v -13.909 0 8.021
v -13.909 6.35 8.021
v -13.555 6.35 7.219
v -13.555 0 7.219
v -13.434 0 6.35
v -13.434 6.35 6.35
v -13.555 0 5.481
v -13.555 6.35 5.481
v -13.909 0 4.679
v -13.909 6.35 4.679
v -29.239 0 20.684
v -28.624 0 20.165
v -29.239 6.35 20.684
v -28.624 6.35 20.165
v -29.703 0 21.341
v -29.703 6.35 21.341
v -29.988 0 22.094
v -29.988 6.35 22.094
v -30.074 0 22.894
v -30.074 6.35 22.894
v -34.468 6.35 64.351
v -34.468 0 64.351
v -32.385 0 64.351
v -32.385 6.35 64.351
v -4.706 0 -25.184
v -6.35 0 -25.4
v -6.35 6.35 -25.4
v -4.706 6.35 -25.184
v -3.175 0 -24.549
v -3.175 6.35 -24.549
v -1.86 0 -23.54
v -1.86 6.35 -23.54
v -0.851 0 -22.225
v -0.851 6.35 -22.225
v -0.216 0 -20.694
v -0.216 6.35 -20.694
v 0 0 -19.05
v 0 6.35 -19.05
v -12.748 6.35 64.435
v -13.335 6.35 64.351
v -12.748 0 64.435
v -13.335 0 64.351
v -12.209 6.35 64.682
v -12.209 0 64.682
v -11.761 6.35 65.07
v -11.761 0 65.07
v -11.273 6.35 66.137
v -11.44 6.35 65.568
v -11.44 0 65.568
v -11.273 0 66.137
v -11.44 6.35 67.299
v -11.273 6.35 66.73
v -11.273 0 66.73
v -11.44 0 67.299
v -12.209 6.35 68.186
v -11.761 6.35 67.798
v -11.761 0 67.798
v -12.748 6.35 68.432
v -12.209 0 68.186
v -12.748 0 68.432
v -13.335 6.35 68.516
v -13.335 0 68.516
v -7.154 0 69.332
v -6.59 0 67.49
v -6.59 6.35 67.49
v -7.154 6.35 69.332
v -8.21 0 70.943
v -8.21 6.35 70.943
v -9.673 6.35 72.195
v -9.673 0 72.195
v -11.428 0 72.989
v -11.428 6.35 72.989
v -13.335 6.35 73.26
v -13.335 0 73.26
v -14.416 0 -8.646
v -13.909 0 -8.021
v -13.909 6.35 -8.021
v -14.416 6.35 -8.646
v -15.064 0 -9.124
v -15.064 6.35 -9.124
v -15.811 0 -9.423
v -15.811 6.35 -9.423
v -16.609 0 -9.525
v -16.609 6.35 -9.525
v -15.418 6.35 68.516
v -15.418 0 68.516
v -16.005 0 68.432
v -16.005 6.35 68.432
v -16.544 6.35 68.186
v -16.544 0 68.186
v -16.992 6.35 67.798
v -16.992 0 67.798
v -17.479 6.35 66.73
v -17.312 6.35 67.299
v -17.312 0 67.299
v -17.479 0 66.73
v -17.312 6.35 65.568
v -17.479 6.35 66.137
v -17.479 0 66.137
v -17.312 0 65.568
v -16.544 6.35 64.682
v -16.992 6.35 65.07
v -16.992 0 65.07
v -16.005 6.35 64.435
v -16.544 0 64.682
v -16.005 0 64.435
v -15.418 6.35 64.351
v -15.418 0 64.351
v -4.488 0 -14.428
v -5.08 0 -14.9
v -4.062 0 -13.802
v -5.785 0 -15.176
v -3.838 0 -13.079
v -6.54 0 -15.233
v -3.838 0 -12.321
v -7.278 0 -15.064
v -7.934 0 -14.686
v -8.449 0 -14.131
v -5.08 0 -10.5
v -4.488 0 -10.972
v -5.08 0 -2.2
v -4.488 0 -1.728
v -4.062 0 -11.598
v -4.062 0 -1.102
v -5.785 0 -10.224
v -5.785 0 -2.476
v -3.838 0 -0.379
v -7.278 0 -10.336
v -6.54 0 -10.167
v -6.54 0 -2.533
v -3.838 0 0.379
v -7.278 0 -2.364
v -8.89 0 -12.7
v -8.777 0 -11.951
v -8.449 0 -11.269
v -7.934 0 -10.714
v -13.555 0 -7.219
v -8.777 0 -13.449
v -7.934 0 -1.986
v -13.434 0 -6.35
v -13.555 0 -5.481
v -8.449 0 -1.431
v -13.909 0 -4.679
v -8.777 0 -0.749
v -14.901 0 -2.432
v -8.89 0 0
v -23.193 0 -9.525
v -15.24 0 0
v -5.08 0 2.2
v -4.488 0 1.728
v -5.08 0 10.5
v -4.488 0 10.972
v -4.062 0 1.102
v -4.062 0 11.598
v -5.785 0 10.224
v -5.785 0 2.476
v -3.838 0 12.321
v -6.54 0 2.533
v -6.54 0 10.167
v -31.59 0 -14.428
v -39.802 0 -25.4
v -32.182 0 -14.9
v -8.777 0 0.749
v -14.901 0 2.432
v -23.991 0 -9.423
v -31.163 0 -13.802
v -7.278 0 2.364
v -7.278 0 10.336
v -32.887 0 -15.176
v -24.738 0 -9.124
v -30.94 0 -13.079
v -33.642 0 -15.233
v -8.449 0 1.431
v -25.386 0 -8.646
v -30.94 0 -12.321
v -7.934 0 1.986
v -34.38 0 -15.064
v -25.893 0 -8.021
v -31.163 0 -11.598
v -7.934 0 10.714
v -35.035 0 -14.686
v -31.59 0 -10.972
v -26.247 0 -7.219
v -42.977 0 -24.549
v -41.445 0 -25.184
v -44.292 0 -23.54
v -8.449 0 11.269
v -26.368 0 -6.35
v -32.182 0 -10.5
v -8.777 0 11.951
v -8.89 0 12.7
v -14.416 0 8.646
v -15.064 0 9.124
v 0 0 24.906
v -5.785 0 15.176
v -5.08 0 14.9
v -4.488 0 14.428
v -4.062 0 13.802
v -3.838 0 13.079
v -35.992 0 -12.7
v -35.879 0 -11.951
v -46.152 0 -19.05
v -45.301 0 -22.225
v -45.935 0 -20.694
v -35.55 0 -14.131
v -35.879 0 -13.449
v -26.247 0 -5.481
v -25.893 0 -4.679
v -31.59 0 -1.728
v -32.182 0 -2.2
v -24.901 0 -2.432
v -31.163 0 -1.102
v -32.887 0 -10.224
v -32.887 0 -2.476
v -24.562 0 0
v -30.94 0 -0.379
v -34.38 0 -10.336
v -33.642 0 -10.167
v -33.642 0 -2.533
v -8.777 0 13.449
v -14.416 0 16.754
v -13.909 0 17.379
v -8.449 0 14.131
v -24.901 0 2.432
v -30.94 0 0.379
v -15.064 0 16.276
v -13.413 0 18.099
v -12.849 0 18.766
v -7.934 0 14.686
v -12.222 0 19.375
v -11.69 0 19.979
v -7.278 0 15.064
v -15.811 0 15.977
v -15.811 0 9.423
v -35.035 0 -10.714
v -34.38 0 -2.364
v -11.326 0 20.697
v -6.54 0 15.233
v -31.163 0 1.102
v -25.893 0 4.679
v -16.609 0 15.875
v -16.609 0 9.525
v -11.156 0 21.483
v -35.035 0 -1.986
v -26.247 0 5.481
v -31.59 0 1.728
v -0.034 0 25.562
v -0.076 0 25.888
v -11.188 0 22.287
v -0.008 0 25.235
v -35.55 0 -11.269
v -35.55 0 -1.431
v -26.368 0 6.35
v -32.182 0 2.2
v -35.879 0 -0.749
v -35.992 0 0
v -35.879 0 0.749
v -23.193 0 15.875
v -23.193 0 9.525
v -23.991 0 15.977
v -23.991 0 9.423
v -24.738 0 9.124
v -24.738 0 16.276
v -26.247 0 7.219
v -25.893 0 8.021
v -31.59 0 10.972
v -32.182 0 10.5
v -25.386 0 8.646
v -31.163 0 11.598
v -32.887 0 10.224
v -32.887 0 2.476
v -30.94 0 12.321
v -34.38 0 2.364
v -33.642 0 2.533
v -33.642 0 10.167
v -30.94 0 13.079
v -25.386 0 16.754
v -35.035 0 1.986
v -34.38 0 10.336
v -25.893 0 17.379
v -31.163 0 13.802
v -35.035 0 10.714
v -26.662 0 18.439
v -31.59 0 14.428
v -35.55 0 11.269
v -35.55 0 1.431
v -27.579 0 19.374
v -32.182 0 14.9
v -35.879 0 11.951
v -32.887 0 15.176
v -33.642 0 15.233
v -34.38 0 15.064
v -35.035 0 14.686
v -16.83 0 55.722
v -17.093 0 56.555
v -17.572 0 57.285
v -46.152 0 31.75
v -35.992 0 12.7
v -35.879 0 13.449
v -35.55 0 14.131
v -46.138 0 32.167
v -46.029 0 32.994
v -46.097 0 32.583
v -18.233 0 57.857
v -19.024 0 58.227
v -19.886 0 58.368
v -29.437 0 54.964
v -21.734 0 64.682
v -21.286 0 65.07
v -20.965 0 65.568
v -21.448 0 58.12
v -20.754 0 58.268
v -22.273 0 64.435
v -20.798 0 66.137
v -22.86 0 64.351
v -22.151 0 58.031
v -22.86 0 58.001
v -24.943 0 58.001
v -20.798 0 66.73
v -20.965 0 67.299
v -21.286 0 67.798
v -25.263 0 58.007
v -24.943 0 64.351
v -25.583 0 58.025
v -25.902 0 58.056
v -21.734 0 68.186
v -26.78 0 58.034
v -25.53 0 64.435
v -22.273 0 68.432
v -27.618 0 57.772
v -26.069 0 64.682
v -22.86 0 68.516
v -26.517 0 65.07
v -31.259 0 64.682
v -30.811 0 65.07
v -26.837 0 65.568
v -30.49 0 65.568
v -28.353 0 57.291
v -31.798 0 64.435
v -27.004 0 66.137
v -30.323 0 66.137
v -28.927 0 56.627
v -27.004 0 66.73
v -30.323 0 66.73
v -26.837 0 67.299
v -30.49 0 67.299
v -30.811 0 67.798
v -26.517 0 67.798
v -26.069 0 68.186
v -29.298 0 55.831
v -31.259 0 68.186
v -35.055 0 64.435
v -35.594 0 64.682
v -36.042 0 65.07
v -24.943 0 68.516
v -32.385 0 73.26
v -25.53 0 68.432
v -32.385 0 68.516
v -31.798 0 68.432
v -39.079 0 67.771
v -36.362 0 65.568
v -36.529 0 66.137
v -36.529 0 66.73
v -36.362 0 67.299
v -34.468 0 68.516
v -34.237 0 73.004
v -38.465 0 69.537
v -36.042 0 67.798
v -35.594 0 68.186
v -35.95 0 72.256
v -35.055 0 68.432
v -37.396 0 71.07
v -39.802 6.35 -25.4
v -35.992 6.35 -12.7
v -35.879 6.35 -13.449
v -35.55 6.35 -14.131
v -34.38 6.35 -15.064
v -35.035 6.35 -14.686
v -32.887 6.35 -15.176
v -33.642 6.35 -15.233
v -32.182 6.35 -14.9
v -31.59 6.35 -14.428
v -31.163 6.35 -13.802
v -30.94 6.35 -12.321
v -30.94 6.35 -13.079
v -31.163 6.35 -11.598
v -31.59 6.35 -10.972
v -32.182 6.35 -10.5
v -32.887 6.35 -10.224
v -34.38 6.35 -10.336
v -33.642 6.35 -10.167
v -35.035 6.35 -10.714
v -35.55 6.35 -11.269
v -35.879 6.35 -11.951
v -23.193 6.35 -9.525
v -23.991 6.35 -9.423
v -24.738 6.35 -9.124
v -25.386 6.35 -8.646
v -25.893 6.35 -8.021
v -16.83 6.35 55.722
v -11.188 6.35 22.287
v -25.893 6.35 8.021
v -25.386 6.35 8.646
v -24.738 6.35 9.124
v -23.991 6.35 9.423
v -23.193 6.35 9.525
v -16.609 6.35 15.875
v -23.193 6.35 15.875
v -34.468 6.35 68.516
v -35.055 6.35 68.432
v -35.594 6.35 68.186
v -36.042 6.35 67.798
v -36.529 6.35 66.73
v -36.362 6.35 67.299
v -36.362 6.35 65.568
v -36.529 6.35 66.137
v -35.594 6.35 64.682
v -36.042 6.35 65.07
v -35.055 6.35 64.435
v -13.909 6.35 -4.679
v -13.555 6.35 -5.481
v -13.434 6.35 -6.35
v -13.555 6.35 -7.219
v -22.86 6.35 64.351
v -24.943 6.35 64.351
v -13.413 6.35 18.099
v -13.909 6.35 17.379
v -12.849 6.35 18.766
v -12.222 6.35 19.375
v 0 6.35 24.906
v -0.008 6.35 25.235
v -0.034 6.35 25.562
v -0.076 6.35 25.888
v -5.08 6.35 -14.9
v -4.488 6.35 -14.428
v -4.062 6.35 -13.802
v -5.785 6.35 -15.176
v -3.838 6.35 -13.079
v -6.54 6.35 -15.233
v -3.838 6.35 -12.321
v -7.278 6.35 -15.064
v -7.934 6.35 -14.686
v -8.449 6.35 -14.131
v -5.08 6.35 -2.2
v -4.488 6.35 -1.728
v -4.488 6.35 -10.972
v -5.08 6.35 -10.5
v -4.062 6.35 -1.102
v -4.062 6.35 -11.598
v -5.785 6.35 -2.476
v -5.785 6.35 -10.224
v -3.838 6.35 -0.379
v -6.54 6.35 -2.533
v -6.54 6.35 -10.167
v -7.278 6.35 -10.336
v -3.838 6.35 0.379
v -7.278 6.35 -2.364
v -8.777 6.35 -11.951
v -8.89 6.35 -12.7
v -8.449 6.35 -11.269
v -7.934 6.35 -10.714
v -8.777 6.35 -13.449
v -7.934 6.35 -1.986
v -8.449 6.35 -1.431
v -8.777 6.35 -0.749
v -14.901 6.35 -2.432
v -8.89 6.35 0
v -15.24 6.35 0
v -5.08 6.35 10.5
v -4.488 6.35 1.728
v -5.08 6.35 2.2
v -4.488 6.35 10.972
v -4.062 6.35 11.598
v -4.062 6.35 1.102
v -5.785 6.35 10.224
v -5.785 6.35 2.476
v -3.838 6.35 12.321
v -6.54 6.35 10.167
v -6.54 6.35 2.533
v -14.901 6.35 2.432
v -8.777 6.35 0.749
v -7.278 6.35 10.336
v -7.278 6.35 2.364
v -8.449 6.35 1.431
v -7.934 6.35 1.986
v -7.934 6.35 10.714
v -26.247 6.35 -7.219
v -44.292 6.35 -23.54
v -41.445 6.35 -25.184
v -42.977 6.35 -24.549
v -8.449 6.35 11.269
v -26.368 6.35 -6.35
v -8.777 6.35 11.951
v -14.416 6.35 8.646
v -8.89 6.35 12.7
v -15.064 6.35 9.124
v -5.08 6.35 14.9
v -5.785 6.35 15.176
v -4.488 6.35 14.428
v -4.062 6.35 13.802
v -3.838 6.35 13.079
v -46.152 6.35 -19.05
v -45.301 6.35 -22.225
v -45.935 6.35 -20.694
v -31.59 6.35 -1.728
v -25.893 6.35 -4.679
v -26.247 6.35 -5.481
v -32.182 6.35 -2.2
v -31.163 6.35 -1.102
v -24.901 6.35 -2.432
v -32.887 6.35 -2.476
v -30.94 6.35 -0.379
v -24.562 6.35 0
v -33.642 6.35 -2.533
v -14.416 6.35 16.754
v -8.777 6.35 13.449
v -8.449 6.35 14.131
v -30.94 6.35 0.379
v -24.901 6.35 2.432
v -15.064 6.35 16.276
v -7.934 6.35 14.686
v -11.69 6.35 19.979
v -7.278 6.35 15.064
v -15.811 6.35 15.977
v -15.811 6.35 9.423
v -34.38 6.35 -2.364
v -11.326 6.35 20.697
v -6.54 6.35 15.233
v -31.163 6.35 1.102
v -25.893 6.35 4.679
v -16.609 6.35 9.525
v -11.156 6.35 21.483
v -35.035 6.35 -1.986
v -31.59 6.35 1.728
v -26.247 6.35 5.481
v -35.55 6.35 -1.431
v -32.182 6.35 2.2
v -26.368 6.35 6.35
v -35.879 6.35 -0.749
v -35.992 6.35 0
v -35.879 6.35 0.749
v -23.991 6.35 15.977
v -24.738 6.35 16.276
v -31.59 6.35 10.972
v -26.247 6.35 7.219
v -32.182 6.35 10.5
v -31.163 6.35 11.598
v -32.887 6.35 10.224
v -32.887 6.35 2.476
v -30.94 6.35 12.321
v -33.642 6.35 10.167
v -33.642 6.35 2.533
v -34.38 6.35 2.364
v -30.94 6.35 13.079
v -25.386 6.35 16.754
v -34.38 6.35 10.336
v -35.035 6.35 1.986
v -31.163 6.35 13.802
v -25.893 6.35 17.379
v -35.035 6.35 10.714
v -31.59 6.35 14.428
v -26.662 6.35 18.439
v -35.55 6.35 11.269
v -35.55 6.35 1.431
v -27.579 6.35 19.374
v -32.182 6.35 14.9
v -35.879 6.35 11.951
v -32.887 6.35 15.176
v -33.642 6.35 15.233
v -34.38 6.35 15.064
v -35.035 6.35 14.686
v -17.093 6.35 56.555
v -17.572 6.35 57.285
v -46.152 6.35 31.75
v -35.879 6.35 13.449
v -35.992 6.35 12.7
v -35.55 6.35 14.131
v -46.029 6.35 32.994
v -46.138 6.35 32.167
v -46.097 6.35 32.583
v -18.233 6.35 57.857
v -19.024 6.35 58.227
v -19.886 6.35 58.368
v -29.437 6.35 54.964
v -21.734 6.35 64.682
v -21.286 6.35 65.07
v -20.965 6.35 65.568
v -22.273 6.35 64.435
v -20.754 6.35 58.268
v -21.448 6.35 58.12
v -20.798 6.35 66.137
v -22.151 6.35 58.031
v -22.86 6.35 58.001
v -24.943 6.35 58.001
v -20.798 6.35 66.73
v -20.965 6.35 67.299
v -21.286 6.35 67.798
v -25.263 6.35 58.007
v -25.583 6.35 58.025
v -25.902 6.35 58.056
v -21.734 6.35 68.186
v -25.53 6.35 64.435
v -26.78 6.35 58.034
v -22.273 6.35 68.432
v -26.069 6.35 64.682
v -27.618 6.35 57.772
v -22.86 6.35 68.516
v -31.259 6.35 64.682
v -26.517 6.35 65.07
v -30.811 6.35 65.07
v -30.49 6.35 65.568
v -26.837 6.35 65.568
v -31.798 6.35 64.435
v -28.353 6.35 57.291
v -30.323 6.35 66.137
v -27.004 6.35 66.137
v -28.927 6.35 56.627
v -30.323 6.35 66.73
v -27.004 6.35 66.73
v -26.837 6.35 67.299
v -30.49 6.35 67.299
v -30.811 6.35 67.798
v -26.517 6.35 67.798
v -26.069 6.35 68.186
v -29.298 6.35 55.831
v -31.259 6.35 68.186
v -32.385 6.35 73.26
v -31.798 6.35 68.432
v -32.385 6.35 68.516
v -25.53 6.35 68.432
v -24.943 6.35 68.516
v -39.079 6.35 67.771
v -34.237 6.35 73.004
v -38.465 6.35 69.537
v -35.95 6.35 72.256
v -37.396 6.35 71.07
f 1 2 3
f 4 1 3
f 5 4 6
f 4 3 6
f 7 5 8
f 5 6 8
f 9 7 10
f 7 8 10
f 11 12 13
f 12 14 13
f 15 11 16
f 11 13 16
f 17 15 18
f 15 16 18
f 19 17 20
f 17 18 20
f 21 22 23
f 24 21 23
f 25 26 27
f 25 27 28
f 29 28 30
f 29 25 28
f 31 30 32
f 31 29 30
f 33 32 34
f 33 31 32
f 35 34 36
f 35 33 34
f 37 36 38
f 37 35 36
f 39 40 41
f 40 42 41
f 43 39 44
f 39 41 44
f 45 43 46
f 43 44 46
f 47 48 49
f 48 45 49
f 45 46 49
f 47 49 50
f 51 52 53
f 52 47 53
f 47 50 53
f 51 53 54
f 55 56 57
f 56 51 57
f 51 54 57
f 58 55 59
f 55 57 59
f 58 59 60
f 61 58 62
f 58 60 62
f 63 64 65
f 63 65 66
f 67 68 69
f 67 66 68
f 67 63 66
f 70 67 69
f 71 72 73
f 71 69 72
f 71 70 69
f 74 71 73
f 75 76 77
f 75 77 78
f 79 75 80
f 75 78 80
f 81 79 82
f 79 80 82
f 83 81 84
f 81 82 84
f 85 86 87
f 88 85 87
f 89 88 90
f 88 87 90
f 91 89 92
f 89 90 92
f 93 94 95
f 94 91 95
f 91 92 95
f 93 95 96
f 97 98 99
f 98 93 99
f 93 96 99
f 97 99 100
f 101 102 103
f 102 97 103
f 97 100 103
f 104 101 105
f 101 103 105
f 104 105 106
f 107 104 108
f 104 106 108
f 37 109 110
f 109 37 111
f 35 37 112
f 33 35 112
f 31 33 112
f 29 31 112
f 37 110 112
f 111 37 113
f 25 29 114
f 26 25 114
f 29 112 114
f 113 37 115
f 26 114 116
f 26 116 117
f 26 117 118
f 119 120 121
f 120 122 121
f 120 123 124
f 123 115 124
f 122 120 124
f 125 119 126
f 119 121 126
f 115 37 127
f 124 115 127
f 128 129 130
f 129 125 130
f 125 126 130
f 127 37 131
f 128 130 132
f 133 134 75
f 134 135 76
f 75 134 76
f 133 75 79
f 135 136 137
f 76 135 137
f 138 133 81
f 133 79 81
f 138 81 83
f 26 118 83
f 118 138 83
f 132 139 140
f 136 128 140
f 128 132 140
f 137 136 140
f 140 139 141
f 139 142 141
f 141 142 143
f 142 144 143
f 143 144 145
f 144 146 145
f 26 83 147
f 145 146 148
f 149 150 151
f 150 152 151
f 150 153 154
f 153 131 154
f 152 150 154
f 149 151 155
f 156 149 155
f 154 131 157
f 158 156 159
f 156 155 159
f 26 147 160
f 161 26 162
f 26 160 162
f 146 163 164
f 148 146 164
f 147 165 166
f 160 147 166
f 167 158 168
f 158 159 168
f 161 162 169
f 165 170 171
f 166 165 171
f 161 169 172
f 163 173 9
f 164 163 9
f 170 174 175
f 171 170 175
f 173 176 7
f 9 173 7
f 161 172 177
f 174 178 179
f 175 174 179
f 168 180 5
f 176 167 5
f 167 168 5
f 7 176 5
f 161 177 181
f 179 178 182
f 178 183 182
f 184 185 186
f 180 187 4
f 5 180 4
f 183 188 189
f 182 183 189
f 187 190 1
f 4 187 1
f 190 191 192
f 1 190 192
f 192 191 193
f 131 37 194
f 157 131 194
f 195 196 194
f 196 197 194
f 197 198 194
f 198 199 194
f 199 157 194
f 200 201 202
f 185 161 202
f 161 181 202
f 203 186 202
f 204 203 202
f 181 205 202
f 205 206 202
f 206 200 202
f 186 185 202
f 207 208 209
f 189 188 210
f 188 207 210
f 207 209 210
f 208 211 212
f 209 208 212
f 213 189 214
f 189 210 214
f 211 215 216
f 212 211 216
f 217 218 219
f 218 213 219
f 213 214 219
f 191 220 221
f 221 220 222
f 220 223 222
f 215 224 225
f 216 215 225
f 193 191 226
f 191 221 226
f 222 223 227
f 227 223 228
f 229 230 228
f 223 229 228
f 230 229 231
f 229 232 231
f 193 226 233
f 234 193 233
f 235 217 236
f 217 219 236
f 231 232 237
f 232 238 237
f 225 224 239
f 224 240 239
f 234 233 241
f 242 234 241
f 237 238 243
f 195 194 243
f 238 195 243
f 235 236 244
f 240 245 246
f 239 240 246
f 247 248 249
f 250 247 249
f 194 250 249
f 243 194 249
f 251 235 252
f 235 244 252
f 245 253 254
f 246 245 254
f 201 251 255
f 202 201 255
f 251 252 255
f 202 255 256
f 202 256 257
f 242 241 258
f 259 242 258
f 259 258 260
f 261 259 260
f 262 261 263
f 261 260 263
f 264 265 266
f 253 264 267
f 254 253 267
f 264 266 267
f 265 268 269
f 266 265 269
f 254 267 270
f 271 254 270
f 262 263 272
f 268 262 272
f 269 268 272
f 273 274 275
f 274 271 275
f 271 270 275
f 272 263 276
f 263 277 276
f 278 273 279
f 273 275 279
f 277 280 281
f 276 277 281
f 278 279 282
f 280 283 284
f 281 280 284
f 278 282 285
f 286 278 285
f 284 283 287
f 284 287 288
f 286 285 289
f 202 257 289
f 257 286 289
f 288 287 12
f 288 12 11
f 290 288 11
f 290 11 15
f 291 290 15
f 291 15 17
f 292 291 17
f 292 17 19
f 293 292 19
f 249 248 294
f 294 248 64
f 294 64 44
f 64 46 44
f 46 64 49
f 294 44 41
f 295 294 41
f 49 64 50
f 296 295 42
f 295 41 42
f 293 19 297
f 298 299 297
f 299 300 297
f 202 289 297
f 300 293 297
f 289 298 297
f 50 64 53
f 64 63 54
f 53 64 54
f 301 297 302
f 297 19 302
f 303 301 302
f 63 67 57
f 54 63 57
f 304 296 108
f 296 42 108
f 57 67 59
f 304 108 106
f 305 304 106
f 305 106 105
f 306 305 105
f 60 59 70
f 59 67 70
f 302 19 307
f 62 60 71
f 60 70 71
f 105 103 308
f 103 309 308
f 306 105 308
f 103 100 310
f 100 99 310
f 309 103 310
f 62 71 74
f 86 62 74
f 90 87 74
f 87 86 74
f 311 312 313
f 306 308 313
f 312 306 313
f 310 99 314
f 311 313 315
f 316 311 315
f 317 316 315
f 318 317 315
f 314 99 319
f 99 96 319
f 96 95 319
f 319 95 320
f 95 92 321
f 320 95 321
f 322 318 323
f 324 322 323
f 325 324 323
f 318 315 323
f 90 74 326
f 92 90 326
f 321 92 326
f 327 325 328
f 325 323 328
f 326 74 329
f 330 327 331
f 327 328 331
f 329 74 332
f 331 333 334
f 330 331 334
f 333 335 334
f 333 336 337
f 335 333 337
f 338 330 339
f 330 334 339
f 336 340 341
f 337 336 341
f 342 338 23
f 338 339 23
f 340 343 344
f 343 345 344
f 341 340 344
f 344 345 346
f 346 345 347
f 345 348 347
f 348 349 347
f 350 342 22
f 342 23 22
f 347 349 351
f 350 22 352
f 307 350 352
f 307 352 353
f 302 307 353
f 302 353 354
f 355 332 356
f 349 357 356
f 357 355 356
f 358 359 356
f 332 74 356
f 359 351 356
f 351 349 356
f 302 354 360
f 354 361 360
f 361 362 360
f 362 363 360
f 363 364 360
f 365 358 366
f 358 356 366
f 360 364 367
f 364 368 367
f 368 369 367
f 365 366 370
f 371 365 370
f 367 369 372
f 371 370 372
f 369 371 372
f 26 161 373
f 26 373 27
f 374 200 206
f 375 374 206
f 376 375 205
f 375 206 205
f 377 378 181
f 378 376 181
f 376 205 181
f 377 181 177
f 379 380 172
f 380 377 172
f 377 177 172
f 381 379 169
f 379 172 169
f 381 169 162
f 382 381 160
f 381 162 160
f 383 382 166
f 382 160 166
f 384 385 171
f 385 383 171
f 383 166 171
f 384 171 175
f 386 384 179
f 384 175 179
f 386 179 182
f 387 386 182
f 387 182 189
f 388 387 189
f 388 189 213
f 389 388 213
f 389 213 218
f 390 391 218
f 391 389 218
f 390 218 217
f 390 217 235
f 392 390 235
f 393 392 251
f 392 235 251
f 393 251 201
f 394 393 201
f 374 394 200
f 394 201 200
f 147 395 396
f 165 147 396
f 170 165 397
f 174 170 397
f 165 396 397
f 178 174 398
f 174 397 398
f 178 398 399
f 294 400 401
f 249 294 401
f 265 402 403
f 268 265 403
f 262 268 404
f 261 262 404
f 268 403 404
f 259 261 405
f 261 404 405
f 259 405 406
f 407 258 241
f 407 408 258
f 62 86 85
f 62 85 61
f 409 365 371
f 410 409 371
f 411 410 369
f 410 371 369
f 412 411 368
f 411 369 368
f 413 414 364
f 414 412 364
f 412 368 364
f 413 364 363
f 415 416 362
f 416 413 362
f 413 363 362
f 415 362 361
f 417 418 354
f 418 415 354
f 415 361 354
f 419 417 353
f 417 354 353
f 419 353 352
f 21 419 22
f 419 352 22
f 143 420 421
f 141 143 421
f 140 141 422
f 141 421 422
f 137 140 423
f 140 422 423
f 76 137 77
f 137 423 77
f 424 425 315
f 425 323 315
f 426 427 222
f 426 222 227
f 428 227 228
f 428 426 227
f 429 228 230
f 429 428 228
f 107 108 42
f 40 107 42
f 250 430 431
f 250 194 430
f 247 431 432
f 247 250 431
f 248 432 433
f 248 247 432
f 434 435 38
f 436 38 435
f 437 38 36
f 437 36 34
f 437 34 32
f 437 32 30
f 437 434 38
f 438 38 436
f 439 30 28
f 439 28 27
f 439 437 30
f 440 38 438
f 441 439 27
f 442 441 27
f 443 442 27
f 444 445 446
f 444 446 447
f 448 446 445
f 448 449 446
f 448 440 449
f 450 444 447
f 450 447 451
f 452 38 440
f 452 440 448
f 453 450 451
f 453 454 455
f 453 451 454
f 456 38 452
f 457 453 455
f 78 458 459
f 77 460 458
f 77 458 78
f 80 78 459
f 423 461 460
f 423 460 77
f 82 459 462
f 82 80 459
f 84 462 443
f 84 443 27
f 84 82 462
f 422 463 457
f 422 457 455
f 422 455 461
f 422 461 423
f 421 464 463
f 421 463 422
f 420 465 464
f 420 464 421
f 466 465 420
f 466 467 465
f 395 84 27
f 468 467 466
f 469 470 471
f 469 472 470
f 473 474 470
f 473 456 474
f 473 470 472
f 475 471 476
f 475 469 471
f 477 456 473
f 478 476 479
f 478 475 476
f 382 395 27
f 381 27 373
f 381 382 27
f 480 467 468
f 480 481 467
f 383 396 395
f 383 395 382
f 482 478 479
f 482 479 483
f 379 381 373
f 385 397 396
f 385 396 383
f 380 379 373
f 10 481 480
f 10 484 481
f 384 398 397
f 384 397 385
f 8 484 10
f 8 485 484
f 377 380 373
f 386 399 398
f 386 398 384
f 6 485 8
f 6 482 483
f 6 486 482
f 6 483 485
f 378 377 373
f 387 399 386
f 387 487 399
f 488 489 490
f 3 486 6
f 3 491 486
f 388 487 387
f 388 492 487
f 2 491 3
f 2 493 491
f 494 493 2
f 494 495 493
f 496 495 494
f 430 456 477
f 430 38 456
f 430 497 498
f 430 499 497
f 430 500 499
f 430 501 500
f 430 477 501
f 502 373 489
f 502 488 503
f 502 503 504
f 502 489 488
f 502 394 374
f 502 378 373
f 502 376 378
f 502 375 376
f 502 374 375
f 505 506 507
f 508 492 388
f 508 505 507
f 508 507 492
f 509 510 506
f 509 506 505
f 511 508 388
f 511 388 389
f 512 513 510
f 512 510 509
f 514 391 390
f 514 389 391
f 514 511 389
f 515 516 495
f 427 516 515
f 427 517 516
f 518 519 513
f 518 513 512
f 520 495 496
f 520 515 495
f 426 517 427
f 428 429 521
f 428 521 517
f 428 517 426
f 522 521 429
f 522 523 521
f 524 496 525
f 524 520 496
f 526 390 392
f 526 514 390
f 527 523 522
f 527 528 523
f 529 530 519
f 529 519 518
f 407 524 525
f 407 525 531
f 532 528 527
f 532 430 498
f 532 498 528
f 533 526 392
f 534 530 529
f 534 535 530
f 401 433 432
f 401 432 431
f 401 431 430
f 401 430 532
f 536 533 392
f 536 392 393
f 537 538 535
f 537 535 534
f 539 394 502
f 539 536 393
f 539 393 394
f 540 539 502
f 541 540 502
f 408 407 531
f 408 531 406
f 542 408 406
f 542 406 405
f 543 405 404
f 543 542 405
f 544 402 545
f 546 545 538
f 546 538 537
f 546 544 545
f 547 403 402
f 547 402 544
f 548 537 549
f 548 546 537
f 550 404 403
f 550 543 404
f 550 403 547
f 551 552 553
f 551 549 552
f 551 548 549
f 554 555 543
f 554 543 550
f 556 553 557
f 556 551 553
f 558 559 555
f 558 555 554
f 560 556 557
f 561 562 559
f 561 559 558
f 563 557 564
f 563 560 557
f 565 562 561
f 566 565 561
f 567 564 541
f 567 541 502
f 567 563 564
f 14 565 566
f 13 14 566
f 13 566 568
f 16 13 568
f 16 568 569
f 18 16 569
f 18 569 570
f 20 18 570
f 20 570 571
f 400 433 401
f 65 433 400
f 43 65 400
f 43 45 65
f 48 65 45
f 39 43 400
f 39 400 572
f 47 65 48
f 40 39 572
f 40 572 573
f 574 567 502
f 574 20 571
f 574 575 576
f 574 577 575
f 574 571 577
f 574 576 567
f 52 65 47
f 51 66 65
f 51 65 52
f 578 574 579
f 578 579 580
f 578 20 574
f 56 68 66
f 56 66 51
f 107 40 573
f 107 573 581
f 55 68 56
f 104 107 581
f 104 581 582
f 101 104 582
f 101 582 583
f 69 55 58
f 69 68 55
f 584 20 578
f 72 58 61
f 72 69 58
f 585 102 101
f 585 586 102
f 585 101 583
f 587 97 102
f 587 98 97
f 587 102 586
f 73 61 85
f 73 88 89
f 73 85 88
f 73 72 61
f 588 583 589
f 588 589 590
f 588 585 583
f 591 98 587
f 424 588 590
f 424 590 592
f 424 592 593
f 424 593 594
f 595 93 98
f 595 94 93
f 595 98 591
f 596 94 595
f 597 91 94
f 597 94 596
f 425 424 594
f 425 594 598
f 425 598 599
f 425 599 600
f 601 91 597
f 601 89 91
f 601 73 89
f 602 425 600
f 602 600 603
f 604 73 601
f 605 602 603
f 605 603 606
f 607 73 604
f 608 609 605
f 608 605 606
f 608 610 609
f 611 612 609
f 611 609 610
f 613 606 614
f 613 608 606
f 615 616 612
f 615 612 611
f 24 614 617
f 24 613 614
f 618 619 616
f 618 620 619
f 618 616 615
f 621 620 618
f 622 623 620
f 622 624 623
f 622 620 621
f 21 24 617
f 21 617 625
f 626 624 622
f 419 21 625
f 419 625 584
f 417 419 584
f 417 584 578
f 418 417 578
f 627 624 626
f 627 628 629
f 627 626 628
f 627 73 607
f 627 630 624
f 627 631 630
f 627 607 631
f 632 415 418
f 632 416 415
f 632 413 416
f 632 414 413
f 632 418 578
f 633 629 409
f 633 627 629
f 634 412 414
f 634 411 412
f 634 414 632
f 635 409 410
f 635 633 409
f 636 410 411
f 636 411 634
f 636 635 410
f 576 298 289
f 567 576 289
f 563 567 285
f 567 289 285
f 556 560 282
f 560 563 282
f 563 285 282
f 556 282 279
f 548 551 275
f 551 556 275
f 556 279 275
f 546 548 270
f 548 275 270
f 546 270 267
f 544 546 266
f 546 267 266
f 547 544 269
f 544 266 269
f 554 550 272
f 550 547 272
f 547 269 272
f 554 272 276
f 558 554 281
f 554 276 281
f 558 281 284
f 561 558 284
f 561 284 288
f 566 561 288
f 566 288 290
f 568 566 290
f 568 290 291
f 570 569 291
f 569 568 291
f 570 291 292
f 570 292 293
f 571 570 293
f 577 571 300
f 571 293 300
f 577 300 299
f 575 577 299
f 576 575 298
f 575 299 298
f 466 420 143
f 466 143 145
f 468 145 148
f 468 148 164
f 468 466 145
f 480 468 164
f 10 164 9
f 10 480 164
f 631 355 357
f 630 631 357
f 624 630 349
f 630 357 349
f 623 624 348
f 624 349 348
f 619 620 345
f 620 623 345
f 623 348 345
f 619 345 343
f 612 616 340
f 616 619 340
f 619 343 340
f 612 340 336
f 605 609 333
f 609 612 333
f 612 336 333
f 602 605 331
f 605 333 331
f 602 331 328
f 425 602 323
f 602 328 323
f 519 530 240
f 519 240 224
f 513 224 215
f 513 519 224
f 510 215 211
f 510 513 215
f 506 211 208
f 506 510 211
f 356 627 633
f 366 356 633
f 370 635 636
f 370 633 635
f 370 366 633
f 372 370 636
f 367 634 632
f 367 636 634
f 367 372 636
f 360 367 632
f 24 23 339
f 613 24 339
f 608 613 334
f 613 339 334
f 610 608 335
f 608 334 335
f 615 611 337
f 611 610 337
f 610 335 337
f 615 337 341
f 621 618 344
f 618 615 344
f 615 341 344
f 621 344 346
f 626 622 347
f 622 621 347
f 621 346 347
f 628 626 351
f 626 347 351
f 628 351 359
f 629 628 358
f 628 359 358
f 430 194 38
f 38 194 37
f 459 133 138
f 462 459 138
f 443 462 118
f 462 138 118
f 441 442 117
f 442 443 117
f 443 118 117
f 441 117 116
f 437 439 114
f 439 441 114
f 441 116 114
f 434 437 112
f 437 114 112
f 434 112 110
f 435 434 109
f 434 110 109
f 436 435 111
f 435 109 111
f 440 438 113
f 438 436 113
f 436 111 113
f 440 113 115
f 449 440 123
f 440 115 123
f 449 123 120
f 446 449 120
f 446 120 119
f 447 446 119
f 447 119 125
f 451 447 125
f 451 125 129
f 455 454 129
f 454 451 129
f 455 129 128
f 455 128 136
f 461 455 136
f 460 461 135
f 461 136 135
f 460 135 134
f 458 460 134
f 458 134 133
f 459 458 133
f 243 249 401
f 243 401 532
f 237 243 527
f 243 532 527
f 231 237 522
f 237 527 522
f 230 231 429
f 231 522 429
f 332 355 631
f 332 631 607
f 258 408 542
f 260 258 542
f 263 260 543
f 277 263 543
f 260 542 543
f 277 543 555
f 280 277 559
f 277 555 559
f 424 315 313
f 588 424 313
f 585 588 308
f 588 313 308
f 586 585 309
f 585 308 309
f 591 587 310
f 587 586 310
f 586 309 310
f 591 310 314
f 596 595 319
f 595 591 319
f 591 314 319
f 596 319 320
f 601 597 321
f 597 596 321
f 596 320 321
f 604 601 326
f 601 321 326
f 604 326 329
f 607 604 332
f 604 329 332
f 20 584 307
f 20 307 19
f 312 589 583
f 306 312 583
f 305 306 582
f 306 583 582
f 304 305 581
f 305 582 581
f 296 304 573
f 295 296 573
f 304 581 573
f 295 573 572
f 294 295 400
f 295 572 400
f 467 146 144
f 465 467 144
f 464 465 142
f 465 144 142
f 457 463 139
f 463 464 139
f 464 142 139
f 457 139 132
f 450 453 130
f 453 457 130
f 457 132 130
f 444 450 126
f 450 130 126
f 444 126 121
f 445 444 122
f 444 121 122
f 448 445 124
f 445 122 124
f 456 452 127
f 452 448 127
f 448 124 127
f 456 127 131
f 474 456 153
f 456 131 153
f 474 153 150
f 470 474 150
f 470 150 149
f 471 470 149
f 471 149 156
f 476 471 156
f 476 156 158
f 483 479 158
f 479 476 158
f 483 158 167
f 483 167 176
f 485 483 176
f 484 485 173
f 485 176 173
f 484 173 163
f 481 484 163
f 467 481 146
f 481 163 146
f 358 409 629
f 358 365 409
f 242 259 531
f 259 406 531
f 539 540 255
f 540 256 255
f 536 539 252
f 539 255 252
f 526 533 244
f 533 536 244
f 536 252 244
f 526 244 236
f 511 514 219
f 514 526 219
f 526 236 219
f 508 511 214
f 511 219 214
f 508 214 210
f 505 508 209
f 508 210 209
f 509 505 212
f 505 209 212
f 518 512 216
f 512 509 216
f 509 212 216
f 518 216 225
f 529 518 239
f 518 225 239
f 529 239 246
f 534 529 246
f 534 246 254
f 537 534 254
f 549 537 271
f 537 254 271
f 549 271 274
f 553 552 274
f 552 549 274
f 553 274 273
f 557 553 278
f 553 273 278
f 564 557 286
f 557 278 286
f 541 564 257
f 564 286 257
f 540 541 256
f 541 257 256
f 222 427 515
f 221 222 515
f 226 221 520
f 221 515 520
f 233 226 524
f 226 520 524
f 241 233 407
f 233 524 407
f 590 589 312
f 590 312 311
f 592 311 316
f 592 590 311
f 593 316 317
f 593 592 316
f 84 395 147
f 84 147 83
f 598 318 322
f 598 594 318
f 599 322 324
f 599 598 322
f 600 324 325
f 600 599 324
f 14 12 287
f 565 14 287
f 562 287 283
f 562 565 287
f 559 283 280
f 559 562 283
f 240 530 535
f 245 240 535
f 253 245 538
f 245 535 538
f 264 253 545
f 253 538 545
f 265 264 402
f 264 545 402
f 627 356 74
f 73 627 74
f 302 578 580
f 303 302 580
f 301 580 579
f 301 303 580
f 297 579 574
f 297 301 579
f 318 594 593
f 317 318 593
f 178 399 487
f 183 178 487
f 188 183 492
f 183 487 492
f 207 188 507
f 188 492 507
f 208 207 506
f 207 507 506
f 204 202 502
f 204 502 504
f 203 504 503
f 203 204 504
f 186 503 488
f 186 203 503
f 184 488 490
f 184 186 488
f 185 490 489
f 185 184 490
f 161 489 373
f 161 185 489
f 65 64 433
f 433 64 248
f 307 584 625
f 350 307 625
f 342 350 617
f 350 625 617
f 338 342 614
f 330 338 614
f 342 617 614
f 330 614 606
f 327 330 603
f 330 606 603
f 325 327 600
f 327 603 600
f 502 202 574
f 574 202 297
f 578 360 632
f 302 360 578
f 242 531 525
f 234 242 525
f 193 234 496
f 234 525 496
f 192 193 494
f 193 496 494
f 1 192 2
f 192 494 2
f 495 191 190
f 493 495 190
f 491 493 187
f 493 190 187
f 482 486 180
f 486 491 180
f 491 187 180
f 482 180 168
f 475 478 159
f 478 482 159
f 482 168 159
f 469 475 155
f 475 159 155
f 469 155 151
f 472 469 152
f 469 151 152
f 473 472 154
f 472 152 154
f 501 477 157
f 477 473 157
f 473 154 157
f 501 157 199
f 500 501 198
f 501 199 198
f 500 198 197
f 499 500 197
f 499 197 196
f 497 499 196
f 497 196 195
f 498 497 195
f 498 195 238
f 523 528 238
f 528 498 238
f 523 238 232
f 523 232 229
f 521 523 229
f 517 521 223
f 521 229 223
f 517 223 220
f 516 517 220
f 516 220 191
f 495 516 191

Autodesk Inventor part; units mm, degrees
ref_plane "YZ Plane" through (0, 0, 0) normal (1, 0, 0) x (0, 1, 0)
ref_plane "XZ Plane" through (0, 0, 0) normal (0, 1, 0) x (-1, 0, 0)
ref_plane "XY Plane" through (0, 0, 0) normal (0, 0, 1) x (1, 0, 0)
sketch "Sketch1" plane through (0, 0, 0) normal (0, 1, 0) x (-1, 0, 0)
  line L0 (0, 25.4) -> (0, -25.4) construction
  line L1 (0, -25.4) -> (46.1518, -25.4) construction
  line L2 (15.4178, 64.3509) -> (13.335, 64.3509)
  line L3 (15.4178, 68.5165) -> (13.335, 68.5165)
  arc A0 (13.335, 68.5165) -> (13.335, 64.3509) centre (13.335, 66.4337) ccw
  arc A1 (15.4178, 64.3509) -> (15.4178, 68.5165) centre (15.4178, 66.4337) ccw
  circle A2 centre (13.335, 66.4337) radius 6.8266 construction
  line L4 (32.385, 73.2603) -> (13.335, 73.2603)
  circle A3 centre (6.35, 0) radius 2.54
  circle A4 centre (6.35, -12.7) radius 2.54
  circle A5 centre (6.35, 12.7) radius 2.54
  line L5 (6.35, -12.7) -> (6.35, 12.7) construction
  line L6 (6.5905, 67.4898) -> (0.0764, 25.8882)
  line L7 (0, 24.9059) -> (0, -19.05)
  arc A6 (0.0764, 25.8882) -> (0, 24.9059) centre (6.35, 24.9059) ccw
  line L8 (46.1518, -19.05) -> (46.1518, 31.75)
  line L9 (39.0793, 67.7714) -> (46.0287, 32.9943)
  arc A7 (46.1518, 31.75) -> (46.0287, 32.9943) centre (39.8018, 31.75) ccw
  arc A8 (13.335, 73.2603) -> (6.5905, 67.4898) centre (13.335, 66.4337) ccw
  line L10 (39.8018, -25.4) -> (6.35, -25.4)
  circle A9 centre (33.4518, 12.7) radius 2.54
  circle A10 centre (33.4518, 0) radius 2.54
  circle A11 centre (33.4518, -12.7) radius 2.54
  line L11 (33.4518, -12.7) -> (33.4518, 12.7) construction
  arc A12 (39.8018, -25.4) -> (46.1518, -19.05) centre (39.8018, -19.05) ccw
  arc A13 (0, -19.05) -> (6.35, -25.4) centre (6.35, -19.05) ccw
  arc A14 (24.9428, 64.3509) -> (24.9428, 68.5165) centre (24.9428, 66.4337) ccw
  line L12 (24.9428, 64.3509) -> (22.86, 64.3509)
  line L13 (24.9428, 68.5165) -> (22.86, 68.5165)
  arc A15 (22.86, 68.5165) -> (22.86, 64.3509) centre (22.86, 66.4337) ccw
  circle A16 centre (22.86, 66.4337) radius 6.8266 construction
  arc A17 (34.4678, 64.3509) -> (34.4678, 68.5165) centre (34.4678, 66.4337) ccw
  line L14 (34.4678, 64.3509) -> (32.385, 64.3509)
  line L15 (34.4678, 68.5165) -> (32.385, 68.5165)
  arc A18 (32.385, 68.5165) -> (32.385, 64.3509) centre (32.385, 66.4337) ccw
  circle A19 centre (32.385, 66.4337) radius 6.8266 construction
  arc A20 (39.0793, 67.7714) -> (32.385, 73.2603) centre (32.385, 66.4337) ccw
  line L16 (34.4678, 66.4337) -> (13.335, 66.4337) construction
  point P0 (0, 0)
  point P1 (0, 0)
  point P2 (22.86, 73.2603)
  point P3 (16.1155, 67.4898)
  point P4 (25.6405, 67.4898)
  dimension "d2" = 50.8
  dimension "d3" = 6.35
  dimension "d6" = 91.8337
  dimension "d8" = 13.335
  dimension "d9" = 2.0828
  dimension "d10" = 2.0828
  dimension "d11" = 2.0828
  dimension "d21" = 13.6533
  dimension "d31" = 5.08
  dimension "d32" = 12.7
  dimension "d33" = 12.7
  dimension "d41" = 6.35
  dimension "d42" = 6.35
  dimension "d43" = 13.335
  dimension "d45" = 12.7
  dimension "d46" = 12.7
  dimension "d47" = 6.35
  dimension "d85" = 9.525
  dimension "d90" = 27.1018
extrude "Extrusion3" add sketch "Sketch1" along normal blind 6.35
sketch "Sketch3" plane through (0, 6.35, 0) normal (0, 1, 0) x (1, 0, 0)
  line L0 (-32.385, -73.2603) -> (-13.335, -73.2603) construction
  arc A0 (-13.335, -73.2603) -> (-6.5905, -67.4898) centre (-13.335, -66.4337) ccw construction
  line L1 (-6.5905, -67.4898) -> (-0.0764, -25.8882) construction
  arc A1 (-0.0764, -25.8882) -> (0, -24.9059) centre (-6.35, -24.9059) ccw construction
  line L2 (0, -24.9059) -> (0, 19.05) construction
  arc A2 (0, 19.05) -> (-6.35, 25.4) centre (-6.35, 19.05) ccw construction
  line L3 (-6.35, 25.4) -> (-39.8018, 25.4) construction
  arc A3 (-39.8018, 25.4) -> (-46.1518, 19.05) centre (-39.8018, 19.05) ccw construction
  line L4 (-46.1518, 19.05) -> (-46.1518, -31.75) construction
  arc A4 (-46.1518, -31.75) -> (-46.0287, -32.9943) centre (-39.8018, -31.75) ccw construction
  line L5 (-46.0287, -32.9943) -> (-39.0793, -67.7714) construction
  arc A5 (-39.0793, -67.7714) -> (-32.385, -73.2603) centre (-32.385, -66.4337) ccw construction
  circle A6 centre (-6.35, 0) radius 2.54 construction
  circle A7 centre (-6.35, 12.7) radius 2.54 construction
  circle A8 centre (-6.35, -12.7) radius 2.54 construction
  circle A9 centre (-33.4518, -12.7) radius 2.54 construction
  circle A10 centre (-33.4518, 0) radius 2.54 construction
  circle A11 centre (-33.4518, 12.7) radius 2.54 construction
  line L6 (-34.4678, -64.3509) -> (-32.385, -64.3509) construction
  arc A12 (-32.385, -68.5165) -> (-32.385, -64.3509) centre (-32.385, -66.4337) ccw construction
  line L7 (-32.385, -68.5165) -> (-34.4678, -68.5165) construction
  arc A13 (-34.4678, -64.3509) -> (-34.4678, -68.5165) centre (-34.4678, -66.4337) ccw construction
  line L8 (-24.9428, -64.3509) -> (-22.86, -64.3509) construction
  arc A14 (-22.86, -68.5165) -> (-22.86, -64.3509) centre (-22.86, -66.4337) ccw construction
  line L9 (-22.86, -68.5165) -> (-24.9428, -68.5165) construction
  arc A15 (-24.9428, -64.3509) -> (-24.9428, -68.5165) centre (-24.9428, -66.4337) ccw construction
  arc A16 (-15.4178, -64.3509) -> (-15.4178, -68.5165) centre (-15.4178, -66.4337) ccw construction
  line L10 (-15.4178, -64.3509) -> (-13.335, -64.3509) construction
  arc A17 (-13.335, -68.5165) -> (-13.335, -64.3509) centre (-13.335, -66.4337) ccw construction
  line L11 (-13.335, -68.5165) -> (-15.4178, -68.5165) construction
  line L12 (-32.8524, -66.5271) -> (-39.8018, -31.75) construction
  line L13 (-39.8018, -31.75) -> (-39.8018, 19.05) construction
  line L14 (-39.8018, 19.05) -> (-6.35, 19.05) construction
  line L15 (-6.35, 19.05) -> (-6.35, -24.9059) construction
  line L16 (-6.35, -24.9059) -> (-12.8641, -66.5074) construction
  arc A18 (-13.335, -66.9103) -> (-12.8641, -66.5074) centre (-13.335, -66.4337) ccw construction
  line L17 (-13.335, -66.9103) -> (-32.385, -66.9103) construction
  arc A19 (-32.8524, -66.5271) -> (-32.385, -66.9103) centre (-32.385, -66.4337) ccw construction
  line L18 (-34.4678, -74.8665) -> (-32.385, -74.8665) construction
  arc A20 (-32.385, -74.8665) -> (-32.385, -58.0009) centre (-32.385, -66.4337) ccw construction
  line L19 (-32.385, -58.0009) -> (-34.4678, -58.0009) construction
  arc A21 (-34.4678, -58.0009) -> (-34.4678, -74.8665) centre (-34.4678, -66.4337) ccw construction
  line L20 (-24.9428, -74.8665) -> (-22.86, -74.8665) construction
  arc A22 (-22.86, -74.8665) -> (-22.86, -58.0009) centre (-22.86, -66.4337) ccw construction
  line L21 (-22.86, -58.0009) -> (-24.9428, -58.0009) construction
  arc A23 (-24.9428, -58.0009) -> (-24.9428, -74.8665) centre (-24.9428, -66.4337) ccw construction
  arc A24 (-15.4178, -58.0009) -> (-15.4178, -74.8665) centre (-15.4178, -66.4337) ccw construction
  line L22 (-15.4178, -58.0009) -> (-13.335, -58.0009) construction
  arc A25 (-13.335, -74.8665) -> (-13.335, -58.0009) centre (-13.335, -66.4337) ccw construction
  line L23 (-13.335, -74.8665) -> (-15.4178, -74.8665) construction
  circle A26 centre (-33.4518, -12.7) radius 8.89 construction
  circle A27 centre (-33.4518, 0) radius 8.89 construction
  circle A28 centre (-33.4518, 12.7) radius 8.89 construction
  circle A29 centre (-6.35, 12.7) radius 8.89 construction
  circle A30 centre (-6.35, 0) radius 8.89 construction
  circle A31 centre (-6.35, -12.7) radius 8.89 construction
  line L24 (-24.5618, -12.7) -> (-15.24, -12.7) construction
  line L25 (-24.5618, 12.7) -> (-15.24, 12.7) construction
  line L26 (-32.5524, -58.0009) -> (-33.2753, -21.5882) construction
  line L27 (-13.9947, -58.0009) -> (-7.8293, -21.4661) construction
  line L28 (-29.4371, -54.9642) -> (-30.0738, -22.8937)
  line L29 (-16.8301, -55.7221) -> (-11.1878, -22.2874)
  line L30 (-23.1931, -15.875) -> (-16.6087, -15.875)
  line L31 (-23.1931, -9.525) -> (-16.6087, -9.525)
  line L32 (-23.1931, 9.525) -> (-16.6087, 9.525)
  arc A32 (-28.6237, -20.1647) -> (-25.8927, -17.3789) centre (-33.4518, -12.7) ccw
  arc A33 (-13.9091, -17.3789) -> (-12.2216, -19.3751) centre (-6.35, -12.7) ccw
  arc A34 (-28.6237, -20.1647) -> (-30.0738, -22.8937) centre (-26.8994, -22.8307) ccw
  arc A35 (-23.1931, -15.875) -> (-25.8927, -17.3789) centre (-23.1931, -19.05) ccw
  arc A36 (-13.9091, -17.3789) -> (-16.6087, -15.875) centre (-16.6087, -19.05) ccw
  arc A37 (-11.1878, -22.2874) -> (-12.2216, -19.3751) centre (-14.3185, -21.7591) ccw
  arc A38 (-25.8927, -4.6789) -> (-25.8927, 4.6789) centre (-33.4518, 0) ccw
  arc A39 (-13.9091, 4.6789) -> (-13.9091, -4.6789) centre (-6.35, 0) ccw
  arc A40 (-13.9091, -8.0211) -> (-13.9091, -8.0211) centre (-6.35, -12.7) ccw
  arc A41 (-25.8927, -8.0211) -> (-25.8927, -8.0211) centre (-33.4518, -12.7) ccw
  arc A42 (-25.8927, 8.0211) -> (-25.8927, 8.0211) centre (-33.4518, 12.7) ccw
  arc A43 (-13.9091, 8.0211) -> (-13.9091, 8.0211) centre (-6.35, 12.7) ccw
  arc A44 (-25.8927, -8.0211) -> (-23.1931, -9.525) centre (-23.1931, -6.35) ccw
  arc A45 (-25.8927, -4.6789) -> (-25.8927, -8.0211) centre (-23.1931, -6.35) ccw
  arc A46 (-23.1931, 9.525) -> (-25.8927, 8.0211) centre (-23.1931, 6.35) ccw
  arc A47 (-25.8927, 8.0211) -> (-25.8927, 4.6789) centre (-23.1931, 6.35) ccw
  arc A48 (-13.9091, 8.0211) -> (-16.6087, 9.525) centre (-16.6087, 6.35) ccw
  arc A49 (-13.9091, 4.6789) -> (-13.9091, 8.0211) centre (-16.6087, 6.35) ccw
  arc A50 (-16.6087, -9.525) -> (-13.9091, -8.0211) centre (-16.6087, -6.35) ccw
  arc A51 (-13.9091, -8.0211) -> (-13.9091, -4.6789) centre (-16.6087, -6.35) ccw
  arc A52 (-24.9428, -58.0009) -> (-25.9017, -58.0556) centre (-24.9428, -66.4337) ccw
  arc A53 (-20.7538, -58.2682) -> (-22.86, -58.0009) centre (-22.86, -66.4337) ccw
  arc A54 (-17.2486, -58.202) -> (-19.1389, -58.8663) centre (-15.4178, -66.4337) ccw
  arc A55 (-28.6639, -58.8663) -> (-29.3657, -58.56) centre (-32.385, -66.4337) ccw
  arc A56 (-29.4371, -54.9642) -> (-25.9017, -58.0556) centre (-26.2627, -54.9012) ccw
  arc A57 (-20.7538, -58.2682) -> (-16.8301, -55.7221) centre (-19.9608, -55.1938) ccw
  line L33 (-24.9428, -58.0009) -> (-22.86, -58.0009)
  point P0 (0, 0)
  point P1 (-30.1126, -20.939)
  point P2 (-10.8625, -20.3596)
  point P3 (-25.1481, -15.875)
  point P4 (-14.6537, -15.875)
  point P5 (-25.1481, -9.525)
  point P6 (-14.6537, -9.525)
  point P7 (-25.1481, 9.525)
  point P8 (-14.6537, 9.525)
  point P9 (-13.9091, 8.0211)
  point P10 (-25.8927, 8.0211)
  dimension "d93" = 6.35
  dimension "d94" = 6.35
  dimension "d95" = 6.35
  dimension "d96" = 6.35
  dimension "d97" = 6.35
  dimension "d98" = 6.35
  dimension "d99" = 6.35
  dimension "d100" = 6.35
  dimension "d101" = 6.35
  dimension "d102" = 6.35
  dimension "d104" = 3.175
  dimension "d105" = 3.175
  dimension "d107" = 3.175
  dimension "d108" = 3.175
  dimension "d109" = 3.175
  dimension "d112" = 3.175
  dimension "d113" = 3.175
  dimension "d114" = 3.175
  dimension "d115" = 3.175
  dimension "d116" = 3.175
  dimension "d119" = 3.175
extrude "Extrusion5" cut sketch "Sketch3" against normal blind 25.4 contours L28 A34 A32 A35 L30 A36 A33 A37 L29 A57 A53 L33 A52 A56 | A45 A38 A47 A46 L32 A48 A49 A39 A51 A50 L31 A44
properties part number "ELEV_025_CHAINCLAMP1" material "Steel"
